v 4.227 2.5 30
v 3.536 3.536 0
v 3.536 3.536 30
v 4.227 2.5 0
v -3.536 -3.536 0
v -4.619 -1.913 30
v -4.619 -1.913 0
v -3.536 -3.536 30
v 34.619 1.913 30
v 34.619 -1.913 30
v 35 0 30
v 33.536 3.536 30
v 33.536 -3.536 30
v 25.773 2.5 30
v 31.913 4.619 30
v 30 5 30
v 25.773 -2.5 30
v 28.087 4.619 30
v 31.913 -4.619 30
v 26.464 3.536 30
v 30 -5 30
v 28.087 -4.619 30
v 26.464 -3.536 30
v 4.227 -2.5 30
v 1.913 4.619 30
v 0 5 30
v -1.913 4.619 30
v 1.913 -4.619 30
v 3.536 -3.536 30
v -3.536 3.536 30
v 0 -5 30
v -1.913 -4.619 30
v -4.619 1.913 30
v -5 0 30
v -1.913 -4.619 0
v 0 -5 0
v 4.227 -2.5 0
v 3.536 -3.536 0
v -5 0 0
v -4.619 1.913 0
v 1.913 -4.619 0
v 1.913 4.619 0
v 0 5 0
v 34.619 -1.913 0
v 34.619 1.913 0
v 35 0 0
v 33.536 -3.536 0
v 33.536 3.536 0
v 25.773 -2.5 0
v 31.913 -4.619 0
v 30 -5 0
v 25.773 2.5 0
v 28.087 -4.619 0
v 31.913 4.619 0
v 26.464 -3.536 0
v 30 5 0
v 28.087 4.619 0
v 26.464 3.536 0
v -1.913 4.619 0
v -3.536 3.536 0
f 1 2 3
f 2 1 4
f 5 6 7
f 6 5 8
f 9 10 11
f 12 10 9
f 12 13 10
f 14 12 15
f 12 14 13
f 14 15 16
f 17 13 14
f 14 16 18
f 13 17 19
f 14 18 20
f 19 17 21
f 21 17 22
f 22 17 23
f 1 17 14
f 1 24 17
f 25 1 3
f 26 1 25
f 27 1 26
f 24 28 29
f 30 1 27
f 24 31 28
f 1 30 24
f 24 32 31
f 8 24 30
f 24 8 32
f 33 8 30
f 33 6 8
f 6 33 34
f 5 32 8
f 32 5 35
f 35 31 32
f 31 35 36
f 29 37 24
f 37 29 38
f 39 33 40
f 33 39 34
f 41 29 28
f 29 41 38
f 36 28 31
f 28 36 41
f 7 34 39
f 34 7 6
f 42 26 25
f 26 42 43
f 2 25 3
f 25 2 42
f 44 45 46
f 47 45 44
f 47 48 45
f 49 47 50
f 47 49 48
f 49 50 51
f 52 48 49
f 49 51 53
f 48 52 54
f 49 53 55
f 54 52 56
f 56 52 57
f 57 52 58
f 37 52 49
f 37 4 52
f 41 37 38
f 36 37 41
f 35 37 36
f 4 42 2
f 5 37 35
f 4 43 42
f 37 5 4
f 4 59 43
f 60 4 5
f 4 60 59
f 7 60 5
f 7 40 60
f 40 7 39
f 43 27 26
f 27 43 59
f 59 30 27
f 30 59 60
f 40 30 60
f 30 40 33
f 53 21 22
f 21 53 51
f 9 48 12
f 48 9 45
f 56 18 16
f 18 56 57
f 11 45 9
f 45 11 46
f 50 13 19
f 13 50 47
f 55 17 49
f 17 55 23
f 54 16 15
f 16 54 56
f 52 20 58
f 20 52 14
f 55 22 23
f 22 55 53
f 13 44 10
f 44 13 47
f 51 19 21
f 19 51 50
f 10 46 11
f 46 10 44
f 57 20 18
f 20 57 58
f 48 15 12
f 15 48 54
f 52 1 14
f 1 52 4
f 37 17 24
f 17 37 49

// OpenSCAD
height = 30;
radius = 5;
lenght = 30;
middle_width = 5;
module extrudedCircle(){
	linear_extrude(height=height){
		circle(radius);
	}
}

extrudedCircle();

translate([lenght,0,0]){
	extrudedCircle();
}

translate([0,-middle_width/2,0]){
	linear_extrude(height=height){
		square([lenght,middle_width],0);
	}
}
